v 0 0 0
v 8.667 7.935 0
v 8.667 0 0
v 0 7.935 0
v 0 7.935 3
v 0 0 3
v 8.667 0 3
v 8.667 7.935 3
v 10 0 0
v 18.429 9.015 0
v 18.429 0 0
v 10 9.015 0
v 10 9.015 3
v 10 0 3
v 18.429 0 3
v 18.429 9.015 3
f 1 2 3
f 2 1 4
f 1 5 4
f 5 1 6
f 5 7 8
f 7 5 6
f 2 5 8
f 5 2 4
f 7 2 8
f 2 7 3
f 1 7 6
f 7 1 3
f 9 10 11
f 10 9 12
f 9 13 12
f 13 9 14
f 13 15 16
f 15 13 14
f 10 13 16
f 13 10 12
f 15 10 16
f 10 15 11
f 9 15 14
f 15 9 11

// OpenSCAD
module Bricks(){
    colors = ["#cb6b6b","#dd7d7d","#9e3333","#842020"];

    single_rand = rands(5,10,1)[0];
    single_rand2 = rands(5,10,1)[0];

    index_color = rands(0,3,1)[0]; // get a single number

    color(colors[index_color])
    linear_extrude(height = 3){
    square([single_rand,single_rand2]);
    }
}

Bricks();

translate([10,0,0])
Bricks();

// Written by Nicolì Angelo (Gengio) 2024: 
// MIT License


//Permission is hereby granted, free of charge, to any person obtaining a copy of this software and associated documentation files (the "Software"), to deal in the Software without restriction, including without limitation the rights to use, copy, modify, merge, publish, distribute, sublicense, and/or sell copies of the Software, and to permit persons to whom the Software is furnished to do so, subject to the following conditions:

//The above copyright notice and this permission notice shall be included in all copies or substantial portions of the Software.

//THE SOFTWARE IS PROVIDED "AS IS", WITHOUT WARRANTY OF ANY KIND, EXPRESS OR IMPLIED, INCLUDING BUT NOT LIMITED TO THE WARRANTIES OF MERCHANTABILITY, FITNESS FOR A PARTICULAR PURPOSE AND NONINFRINGEMENT. IN NO EVENT SHALL THE AUTHORS OR COPYRIGHT HOLDERS BE LIABLE FOR ANY CLAIM, DAMAGES OR OTHER LIABILITY, WHETHER IN AN ACTION OF CONTRACT, TORT OR OTHERWISE, ARISING FROM, OUT OF OR IN CONNECTION WITH THE SOFTWARE OR THE USE OR OTHER DEALINGS IN THE SOFTWARE.
